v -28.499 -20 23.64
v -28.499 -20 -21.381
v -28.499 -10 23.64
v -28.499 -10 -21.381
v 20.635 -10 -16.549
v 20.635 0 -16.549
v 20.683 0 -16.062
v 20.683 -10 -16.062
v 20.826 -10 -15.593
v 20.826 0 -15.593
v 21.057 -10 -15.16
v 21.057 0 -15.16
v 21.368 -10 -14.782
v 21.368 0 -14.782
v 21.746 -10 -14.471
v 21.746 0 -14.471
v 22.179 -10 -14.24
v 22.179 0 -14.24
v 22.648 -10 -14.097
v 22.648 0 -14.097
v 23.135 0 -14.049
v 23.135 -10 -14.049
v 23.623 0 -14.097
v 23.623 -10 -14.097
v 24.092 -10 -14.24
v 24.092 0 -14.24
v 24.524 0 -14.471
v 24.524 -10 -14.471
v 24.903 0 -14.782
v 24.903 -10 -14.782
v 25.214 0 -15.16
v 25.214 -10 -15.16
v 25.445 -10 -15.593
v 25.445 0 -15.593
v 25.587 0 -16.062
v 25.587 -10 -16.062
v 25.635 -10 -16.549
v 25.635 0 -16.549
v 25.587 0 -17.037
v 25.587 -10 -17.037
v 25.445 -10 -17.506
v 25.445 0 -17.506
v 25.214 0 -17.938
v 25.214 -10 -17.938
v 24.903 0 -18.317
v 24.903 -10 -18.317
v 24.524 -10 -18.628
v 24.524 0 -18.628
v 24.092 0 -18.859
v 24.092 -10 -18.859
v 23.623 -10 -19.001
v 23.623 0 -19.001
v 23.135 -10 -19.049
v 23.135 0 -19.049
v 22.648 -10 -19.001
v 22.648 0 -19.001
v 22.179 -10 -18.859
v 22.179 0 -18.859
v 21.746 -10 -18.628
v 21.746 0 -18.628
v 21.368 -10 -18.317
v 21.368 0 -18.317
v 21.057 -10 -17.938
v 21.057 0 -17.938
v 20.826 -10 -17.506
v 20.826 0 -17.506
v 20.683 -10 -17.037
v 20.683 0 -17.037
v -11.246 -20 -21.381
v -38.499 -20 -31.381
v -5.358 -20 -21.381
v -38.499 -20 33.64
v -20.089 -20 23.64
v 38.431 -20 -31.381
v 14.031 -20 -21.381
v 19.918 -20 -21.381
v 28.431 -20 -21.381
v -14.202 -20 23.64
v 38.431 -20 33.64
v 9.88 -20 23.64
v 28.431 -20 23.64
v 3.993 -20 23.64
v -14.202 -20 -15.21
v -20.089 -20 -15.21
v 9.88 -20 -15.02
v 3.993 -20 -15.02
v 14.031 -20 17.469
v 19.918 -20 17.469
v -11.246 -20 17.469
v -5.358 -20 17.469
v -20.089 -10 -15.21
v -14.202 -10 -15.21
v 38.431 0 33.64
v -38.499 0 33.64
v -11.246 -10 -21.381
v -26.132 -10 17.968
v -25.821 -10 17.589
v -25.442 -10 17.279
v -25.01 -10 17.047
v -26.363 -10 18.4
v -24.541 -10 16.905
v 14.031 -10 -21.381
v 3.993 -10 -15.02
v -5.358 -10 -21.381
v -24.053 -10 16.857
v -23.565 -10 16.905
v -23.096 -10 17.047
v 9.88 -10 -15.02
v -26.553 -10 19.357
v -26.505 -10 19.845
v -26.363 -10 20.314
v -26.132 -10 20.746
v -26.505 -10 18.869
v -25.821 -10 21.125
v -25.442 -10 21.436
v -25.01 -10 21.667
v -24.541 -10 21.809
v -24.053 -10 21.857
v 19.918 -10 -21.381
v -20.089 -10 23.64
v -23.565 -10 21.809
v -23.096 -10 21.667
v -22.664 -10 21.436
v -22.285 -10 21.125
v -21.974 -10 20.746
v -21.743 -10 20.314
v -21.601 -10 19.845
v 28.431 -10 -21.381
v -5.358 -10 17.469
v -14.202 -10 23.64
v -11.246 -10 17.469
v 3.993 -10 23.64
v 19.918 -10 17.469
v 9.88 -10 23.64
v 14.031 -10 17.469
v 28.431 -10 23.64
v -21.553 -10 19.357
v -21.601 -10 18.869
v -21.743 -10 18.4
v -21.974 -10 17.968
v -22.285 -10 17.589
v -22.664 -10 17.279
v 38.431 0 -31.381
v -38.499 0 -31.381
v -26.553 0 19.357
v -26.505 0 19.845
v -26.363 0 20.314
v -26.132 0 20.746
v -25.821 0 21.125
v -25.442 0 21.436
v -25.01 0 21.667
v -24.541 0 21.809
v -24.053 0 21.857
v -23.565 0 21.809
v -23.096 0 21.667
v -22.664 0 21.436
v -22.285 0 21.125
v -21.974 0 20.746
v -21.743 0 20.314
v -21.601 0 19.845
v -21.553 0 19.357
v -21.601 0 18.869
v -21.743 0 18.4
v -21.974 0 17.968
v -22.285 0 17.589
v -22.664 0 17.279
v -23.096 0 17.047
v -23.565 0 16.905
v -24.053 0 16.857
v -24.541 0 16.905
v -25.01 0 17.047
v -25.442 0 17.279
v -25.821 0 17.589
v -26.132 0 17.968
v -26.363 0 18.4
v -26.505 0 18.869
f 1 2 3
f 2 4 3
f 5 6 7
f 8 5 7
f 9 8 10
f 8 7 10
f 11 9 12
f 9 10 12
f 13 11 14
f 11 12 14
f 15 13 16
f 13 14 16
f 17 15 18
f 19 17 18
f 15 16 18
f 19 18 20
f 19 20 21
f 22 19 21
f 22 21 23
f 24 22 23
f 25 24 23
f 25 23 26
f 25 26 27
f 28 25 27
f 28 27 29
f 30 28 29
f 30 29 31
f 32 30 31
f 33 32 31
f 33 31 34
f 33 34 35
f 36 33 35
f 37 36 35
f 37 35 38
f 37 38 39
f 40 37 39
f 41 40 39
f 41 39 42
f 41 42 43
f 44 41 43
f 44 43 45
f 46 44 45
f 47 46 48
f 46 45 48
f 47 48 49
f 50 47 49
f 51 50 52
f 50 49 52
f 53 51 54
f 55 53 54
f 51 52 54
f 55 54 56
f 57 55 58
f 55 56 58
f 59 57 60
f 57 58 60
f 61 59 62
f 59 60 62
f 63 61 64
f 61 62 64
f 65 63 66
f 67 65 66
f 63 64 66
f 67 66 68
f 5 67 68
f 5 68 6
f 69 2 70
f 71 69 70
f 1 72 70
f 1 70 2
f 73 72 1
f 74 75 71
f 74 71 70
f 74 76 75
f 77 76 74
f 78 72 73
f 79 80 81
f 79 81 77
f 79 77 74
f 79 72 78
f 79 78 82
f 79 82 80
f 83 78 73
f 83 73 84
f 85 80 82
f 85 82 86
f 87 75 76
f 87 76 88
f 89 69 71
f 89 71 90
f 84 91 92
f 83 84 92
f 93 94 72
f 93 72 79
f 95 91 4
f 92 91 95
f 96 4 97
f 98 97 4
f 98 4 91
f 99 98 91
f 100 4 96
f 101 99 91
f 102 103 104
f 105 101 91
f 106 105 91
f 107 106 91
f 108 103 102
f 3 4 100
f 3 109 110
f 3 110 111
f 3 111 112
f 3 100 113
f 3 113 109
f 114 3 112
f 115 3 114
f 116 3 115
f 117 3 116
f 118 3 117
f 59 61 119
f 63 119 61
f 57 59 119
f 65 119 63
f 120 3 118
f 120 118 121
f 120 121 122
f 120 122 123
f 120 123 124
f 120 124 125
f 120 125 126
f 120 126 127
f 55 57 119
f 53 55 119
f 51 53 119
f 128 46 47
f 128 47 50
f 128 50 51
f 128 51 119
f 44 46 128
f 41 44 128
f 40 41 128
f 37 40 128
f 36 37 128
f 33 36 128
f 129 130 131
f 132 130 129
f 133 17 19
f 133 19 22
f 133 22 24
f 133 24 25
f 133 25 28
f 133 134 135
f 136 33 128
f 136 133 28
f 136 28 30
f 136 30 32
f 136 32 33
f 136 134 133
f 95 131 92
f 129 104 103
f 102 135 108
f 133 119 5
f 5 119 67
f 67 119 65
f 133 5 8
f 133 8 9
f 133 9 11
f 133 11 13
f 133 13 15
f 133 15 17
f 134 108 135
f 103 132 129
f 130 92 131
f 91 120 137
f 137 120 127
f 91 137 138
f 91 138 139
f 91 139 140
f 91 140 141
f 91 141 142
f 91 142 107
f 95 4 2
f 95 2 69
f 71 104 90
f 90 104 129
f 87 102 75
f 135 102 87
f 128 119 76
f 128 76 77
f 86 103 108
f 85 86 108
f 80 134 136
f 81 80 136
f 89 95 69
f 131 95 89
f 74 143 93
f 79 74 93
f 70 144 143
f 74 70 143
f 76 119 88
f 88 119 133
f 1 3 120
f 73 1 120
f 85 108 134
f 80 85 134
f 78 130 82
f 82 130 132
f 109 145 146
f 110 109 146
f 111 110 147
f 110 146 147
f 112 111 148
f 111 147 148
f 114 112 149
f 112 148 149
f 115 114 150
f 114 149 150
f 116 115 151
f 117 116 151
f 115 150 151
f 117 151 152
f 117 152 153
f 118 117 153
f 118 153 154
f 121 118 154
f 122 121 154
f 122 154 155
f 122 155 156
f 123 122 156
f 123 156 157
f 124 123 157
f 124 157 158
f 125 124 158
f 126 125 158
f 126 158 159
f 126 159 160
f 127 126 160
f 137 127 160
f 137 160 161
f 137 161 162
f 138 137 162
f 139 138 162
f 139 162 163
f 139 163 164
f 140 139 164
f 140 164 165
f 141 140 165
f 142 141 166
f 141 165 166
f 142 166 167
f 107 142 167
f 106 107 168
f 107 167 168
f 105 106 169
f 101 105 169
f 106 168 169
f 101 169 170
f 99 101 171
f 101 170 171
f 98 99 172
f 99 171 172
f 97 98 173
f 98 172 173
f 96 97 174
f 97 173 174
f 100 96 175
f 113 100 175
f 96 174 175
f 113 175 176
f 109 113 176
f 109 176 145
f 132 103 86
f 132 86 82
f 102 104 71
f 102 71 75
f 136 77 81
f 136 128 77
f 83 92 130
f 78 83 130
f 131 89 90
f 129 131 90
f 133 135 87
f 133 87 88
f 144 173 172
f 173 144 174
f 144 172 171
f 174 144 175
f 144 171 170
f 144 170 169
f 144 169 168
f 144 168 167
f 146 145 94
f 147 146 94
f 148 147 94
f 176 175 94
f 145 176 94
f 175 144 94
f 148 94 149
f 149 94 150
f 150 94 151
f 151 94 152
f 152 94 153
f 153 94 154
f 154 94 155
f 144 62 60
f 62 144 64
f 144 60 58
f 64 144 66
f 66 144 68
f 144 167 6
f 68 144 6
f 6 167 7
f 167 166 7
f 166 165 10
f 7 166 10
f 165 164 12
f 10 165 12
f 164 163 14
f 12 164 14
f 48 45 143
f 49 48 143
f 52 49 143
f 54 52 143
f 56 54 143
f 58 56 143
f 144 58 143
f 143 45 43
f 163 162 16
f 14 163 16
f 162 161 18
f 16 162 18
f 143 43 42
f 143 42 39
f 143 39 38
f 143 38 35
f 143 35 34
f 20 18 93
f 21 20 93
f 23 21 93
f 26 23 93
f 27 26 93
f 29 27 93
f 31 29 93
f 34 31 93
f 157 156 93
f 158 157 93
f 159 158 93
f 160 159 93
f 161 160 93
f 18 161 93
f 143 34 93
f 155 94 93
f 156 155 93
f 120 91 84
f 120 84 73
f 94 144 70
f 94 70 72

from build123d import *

# Parameters (mm, degrees)
F0_W     = 76.930061
F0_H     = 65.020956
F1_DEPTH = 20
F2_T     = -10
F4_D     = 5
F5_W     = 5.887607
F5_H     = 38.850113
F5_H_2   = 38.850112
F5_W_2   = 5.887608
F6_DEPTH = 10


with BuildPart() as f1:
    # F0 (on Front) → F1 (new body)
    with BuildSketch(Plane.XZ):
        with Locations((-0.03422, 1.129311)):
            Rectangle(F0_W, F0_H)
    extrude(amount=F1_DEPTH)

    # F2
    f2_openings = [f1.faces().sort_by_distance(p)[0] for p in [
        (-0.034221, -20, 1.129311),
    ]]
    offset(amount=F2_T, openings=f2_openings)

    # F4 (through all)
    with Locations(Plane.XZ.offset(10)):
        with Locations((-24.052991, 19.35718), (23.135278, -16.549327)):
            Hole(F4_D / 2)

    # F5 (on face) → F6 (join)
    with BuildSketch(Plane.XZ.offset(10)):
        with Locations((-17.145664, 4.214733)):
            Rectangle(F5_W, F5_H)
        with Locations((-8.301861, -1.956111)):
            Rectangle(F5_W, F5_H_2)
        with Locations((16.974628, -1.956111)):
            Rectangle(F5_W_2, F5_H_2)
        with Locations((6.936476, 4.405541)):
            Rectangle(F5_W, F5_H)
    extrude(amount=F6_DEPTH)


solid = f1.part
